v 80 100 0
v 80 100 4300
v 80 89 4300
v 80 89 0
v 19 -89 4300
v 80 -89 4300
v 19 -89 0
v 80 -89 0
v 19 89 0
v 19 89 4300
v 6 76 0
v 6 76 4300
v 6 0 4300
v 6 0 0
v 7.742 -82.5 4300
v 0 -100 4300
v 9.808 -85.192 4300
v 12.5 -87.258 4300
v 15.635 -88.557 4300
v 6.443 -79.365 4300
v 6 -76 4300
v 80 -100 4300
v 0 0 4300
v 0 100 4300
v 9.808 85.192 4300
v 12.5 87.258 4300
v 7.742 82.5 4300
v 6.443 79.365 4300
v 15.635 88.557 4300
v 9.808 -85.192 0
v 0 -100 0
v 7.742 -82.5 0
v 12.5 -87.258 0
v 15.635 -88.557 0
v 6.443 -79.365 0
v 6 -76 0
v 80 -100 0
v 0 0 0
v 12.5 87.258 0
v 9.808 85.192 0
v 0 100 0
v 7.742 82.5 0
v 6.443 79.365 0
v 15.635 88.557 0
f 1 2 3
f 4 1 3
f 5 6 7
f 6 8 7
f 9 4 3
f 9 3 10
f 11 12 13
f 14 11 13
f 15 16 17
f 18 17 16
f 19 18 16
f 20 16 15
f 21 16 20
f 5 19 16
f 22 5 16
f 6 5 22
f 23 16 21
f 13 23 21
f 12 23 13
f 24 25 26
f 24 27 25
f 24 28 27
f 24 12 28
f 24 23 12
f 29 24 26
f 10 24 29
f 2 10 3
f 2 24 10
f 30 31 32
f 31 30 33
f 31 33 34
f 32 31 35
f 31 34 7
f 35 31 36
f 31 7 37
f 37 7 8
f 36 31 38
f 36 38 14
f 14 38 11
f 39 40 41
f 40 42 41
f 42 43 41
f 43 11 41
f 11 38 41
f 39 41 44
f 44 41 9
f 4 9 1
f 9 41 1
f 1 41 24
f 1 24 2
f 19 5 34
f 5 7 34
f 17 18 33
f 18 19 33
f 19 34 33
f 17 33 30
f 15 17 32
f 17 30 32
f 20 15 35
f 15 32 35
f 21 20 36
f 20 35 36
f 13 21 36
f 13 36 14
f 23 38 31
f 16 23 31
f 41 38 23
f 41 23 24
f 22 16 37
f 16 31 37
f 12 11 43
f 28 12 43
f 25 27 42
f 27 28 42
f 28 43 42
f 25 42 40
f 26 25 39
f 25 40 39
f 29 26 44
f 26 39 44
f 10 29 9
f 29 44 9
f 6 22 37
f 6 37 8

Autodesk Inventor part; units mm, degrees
ref_plane "YZ Plane" through (0, 0, 0) normal (1, 0, 0) x (0, 1, 0)
ref_plane "Start plane" through (0, 0, 0) normal (0, 0, 1) x (1, 0, 0)
ref_plane "End plane" through (0, 0, 4300) normal (0, 0, 1) x (1, 0, 0)
sketch "Sketch" plane through (0, 0, 0) normal (0, 0, 1) x (1, 0, 0)
  line L0 (0, 0) -> (0, 100)
  line L1 (0, 100) -> (80, 100)
  line L2 (80, 100) -> (80, 89)
  line L3 (80, 89) -> (19, 89)
  line L4 (6, 76) -> (6, 0)
  line L5 (6, 0) -> (0, 0) construction
  line L6 (25.6, 100) -> (25.6, 89) construction
  line L7 (80, 89) -> (80, 89) construction
  line L8 (80, 89) -> (25.6, 89) construction
  line L9 (0, 12) -> (0, -30) construction
  line L10 (-1.5, 0) -> (19.5, 0) construction
  line L11 (0, 0) -> (0, -100)
  line L12 (0, -100) -> (80, -100)
  line L13 (80, -100) -> (80, -89)
  line L14 (80, -89) -> (19, -89)
  line L15 (6, -76) -> (6, 0)
  arc A0 (6, -76) -> (19, -89) centre (19, -76) ccw
  arc A1 (19, 89) -> (6, 76) centre (19, 76) ccw
  line L16 (0, 140) -> (0, -140) construction
  line L17 (-17.8, 0) -> (96.3, 0) construction
  point P0 (6, 89)
  point P1 (6, -89)
  point P2 (25.6, -100)
  point P3 (25.6, -89)
  dimension "d0" = 6
  dimension "d1" = 100
  dimension "d2" = 80
  dimension "d3" = 11
  dimension "d5" = 0
  dimension "d23" = 13
  dimension "d24" = 0
  dimension "d29" = 25.6
extrude "Body" add sketch "Sketch" along normal up to surface (4300 mm away) from surface at 0
sketch "Sketch3" plane through (0, 0, 0) normal (0, 0, 1) x (1, 0, 0)
  line L0 (0, 0) -> (10, 0)
ref_plane "Work Plane3" through (0, 0, 0) normal (0, -1, 0) x (1, 0, 0)
sketch "Sketch4" plane through (0, 0, 0) normal (0, -1, 0) x (1, 0, 0)
  line L0 (-2, 0) -> (12, 0)
  line L1 (-2, 4300) -> (12, 4300)
  dimension "d28" = 4300
equation "\"d0\" = G_T"
equation "\"d1\" = 0.5 * G_H"
equation "\"d2\" = G_W"
equation "\"d3\" = G_T1"
equation "\"d23\" = G_IR"
equation "\"d29\" = G_C"
equation "\"d6\" = G_L"
equation "\"G_W\" = 80"
equation "\"G_H\" = 200"
equation "\"G_T\" = 6"
equation "\"G_T1\" = 11"
equation "\"G_NG\" = 0"
equation "\"G_IR\" = 13"
equation "\"G_C\" = 25.6"
equation "\"G_L\" = d28"
equation "\"ex\" = 0"
equation "\"G_OFFSET_START\" = 0"
equation "\"G_OFFSET_END\" = 0"
properties part number "DIN 1026-2 - UPE 200 - 4300" material "Steel, Mild"
